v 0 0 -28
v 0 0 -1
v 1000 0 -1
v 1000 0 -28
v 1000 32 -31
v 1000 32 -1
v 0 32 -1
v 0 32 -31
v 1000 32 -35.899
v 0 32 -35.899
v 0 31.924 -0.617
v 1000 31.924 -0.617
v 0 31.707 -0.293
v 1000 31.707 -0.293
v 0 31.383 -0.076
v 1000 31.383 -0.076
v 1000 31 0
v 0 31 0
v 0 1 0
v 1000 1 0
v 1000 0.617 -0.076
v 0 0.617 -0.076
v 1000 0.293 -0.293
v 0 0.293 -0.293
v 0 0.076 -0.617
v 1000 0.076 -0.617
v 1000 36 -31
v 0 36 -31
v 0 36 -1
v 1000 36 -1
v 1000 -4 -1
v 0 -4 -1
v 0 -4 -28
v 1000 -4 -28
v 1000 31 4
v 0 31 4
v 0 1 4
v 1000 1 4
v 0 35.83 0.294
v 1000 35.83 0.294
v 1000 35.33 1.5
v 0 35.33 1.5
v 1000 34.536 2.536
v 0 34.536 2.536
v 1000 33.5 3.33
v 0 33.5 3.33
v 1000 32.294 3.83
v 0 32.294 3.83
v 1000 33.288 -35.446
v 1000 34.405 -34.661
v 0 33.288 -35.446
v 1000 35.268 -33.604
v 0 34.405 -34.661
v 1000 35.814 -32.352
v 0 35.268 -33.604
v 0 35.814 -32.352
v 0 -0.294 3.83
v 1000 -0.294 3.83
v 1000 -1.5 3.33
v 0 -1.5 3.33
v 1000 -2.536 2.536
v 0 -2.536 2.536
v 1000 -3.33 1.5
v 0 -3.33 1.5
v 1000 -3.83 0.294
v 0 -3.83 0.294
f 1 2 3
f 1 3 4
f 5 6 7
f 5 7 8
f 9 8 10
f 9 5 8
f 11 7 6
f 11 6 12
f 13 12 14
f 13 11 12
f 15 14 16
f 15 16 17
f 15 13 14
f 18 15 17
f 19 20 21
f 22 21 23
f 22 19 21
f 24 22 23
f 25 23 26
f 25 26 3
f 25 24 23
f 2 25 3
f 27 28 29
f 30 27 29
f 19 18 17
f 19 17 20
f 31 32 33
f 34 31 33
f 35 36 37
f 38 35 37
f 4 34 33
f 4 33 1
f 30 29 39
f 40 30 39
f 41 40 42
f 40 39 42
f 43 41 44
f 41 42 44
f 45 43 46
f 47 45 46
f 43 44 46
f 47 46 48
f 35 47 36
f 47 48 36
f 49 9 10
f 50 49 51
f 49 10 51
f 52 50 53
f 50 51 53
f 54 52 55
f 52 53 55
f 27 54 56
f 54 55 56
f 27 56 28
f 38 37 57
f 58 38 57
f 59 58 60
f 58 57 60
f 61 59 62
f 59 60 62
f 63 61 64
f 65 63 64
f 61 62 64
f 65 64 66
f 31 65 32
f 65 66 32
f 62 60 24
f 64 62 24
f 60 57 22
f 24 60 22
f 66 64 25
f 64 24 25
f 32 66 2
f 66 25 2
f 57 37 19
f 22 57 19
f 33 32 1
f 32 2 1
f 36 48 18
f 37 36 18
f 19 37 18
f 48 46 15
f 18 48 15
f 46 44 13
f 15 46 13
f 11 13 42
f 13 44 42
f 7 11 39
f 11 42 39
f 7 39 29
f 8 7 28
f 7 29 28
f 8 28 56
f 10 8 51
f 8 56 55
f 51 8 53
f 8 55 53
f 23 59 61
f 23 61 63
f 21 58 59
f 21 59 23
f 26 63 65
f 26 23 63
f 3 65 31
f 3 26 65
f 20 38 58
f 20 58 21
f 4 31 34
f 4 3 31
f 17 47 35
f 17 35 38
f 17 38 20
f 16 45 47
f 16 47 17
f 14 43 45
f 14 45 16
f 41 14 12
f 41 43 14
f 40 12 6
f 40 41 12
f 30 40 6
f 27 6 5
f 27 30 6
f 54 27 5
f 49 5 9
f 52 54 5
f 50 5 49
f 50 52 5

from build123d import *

# Parameters (mm, degrees)
EXTRUDE_1_DEPTH     = 1000
SKETCH_2_W          = 8.555369223
SKETCH_2_H          = 36.536948801
CUT_EXTRUDE_1_DEPTH = 1001


with BuildPart() as part:
    # Эскиз1 → Вытянуть-Тонкостенный1 (new body)
    with BuildSketch(Plane(origin=(0, 0, 0), x_dir=(0, 0, -1), z_dir=(1, 0, 0))):
        with BuildLine():
            Line((-4, 31), (-4, 1))
            ThreePointArc((-4, 1), (-2.535533906, -2.535533906), (1, -4))
            Line((1, -4), (31, -4))
            ThreePointArc((31, -4), (34.535533906, -2.535533906), (36, 1))
            Line((36, 1), (36, 31))
            ThreePointArc((36, 31), (34.535533906, 34.535533906), (31, 36))
            Line((31, 36), (1, 36))
            ThreePointArc((1, 36), (-2.535533906, 34.535533906), (-4, 31))
        make_face()
        with BuildLine():
            Line((0, 31), (0, 1))
            ThreePointArc((0, 1), (0.292893219, 0.292893219), (1, 0))
            Line((1, 0), (31, 0))
            ThreePointArc((31, 0), (31.707106781, 0.292893219), (32, 1))
            Line((32, 1), (32, 31))
            ThreePointArc((32, 31), (31.707106781, 31.707106781), (31, 32))
            Line((31, 32), (1, 32))
            ThreePointArc((1, 32), (0.292893219, 31.707106781), (0, 31))
        make_face(mode=Mode.SUBTRACT)
    extrude(amount=EXTRUDE_1_DEPTH)

    # Эскиз2 → Вырез-Вытянуть1 (cut, through all)
    with BuildSketch(Plane(origin=(1000, 0, 0), x_dir=(0, 0, -1), z_dir=(1, 0, 0))):
        with Locations((32.277684611, 13.731525599)):
            Rectangle(SKETCH_2_W, SKETCH_2_H)
    extrude(amount=-CUT_EXTRUDE_1_DEPTH, mode=Mode.SUBTRACT)


solid = part.part
